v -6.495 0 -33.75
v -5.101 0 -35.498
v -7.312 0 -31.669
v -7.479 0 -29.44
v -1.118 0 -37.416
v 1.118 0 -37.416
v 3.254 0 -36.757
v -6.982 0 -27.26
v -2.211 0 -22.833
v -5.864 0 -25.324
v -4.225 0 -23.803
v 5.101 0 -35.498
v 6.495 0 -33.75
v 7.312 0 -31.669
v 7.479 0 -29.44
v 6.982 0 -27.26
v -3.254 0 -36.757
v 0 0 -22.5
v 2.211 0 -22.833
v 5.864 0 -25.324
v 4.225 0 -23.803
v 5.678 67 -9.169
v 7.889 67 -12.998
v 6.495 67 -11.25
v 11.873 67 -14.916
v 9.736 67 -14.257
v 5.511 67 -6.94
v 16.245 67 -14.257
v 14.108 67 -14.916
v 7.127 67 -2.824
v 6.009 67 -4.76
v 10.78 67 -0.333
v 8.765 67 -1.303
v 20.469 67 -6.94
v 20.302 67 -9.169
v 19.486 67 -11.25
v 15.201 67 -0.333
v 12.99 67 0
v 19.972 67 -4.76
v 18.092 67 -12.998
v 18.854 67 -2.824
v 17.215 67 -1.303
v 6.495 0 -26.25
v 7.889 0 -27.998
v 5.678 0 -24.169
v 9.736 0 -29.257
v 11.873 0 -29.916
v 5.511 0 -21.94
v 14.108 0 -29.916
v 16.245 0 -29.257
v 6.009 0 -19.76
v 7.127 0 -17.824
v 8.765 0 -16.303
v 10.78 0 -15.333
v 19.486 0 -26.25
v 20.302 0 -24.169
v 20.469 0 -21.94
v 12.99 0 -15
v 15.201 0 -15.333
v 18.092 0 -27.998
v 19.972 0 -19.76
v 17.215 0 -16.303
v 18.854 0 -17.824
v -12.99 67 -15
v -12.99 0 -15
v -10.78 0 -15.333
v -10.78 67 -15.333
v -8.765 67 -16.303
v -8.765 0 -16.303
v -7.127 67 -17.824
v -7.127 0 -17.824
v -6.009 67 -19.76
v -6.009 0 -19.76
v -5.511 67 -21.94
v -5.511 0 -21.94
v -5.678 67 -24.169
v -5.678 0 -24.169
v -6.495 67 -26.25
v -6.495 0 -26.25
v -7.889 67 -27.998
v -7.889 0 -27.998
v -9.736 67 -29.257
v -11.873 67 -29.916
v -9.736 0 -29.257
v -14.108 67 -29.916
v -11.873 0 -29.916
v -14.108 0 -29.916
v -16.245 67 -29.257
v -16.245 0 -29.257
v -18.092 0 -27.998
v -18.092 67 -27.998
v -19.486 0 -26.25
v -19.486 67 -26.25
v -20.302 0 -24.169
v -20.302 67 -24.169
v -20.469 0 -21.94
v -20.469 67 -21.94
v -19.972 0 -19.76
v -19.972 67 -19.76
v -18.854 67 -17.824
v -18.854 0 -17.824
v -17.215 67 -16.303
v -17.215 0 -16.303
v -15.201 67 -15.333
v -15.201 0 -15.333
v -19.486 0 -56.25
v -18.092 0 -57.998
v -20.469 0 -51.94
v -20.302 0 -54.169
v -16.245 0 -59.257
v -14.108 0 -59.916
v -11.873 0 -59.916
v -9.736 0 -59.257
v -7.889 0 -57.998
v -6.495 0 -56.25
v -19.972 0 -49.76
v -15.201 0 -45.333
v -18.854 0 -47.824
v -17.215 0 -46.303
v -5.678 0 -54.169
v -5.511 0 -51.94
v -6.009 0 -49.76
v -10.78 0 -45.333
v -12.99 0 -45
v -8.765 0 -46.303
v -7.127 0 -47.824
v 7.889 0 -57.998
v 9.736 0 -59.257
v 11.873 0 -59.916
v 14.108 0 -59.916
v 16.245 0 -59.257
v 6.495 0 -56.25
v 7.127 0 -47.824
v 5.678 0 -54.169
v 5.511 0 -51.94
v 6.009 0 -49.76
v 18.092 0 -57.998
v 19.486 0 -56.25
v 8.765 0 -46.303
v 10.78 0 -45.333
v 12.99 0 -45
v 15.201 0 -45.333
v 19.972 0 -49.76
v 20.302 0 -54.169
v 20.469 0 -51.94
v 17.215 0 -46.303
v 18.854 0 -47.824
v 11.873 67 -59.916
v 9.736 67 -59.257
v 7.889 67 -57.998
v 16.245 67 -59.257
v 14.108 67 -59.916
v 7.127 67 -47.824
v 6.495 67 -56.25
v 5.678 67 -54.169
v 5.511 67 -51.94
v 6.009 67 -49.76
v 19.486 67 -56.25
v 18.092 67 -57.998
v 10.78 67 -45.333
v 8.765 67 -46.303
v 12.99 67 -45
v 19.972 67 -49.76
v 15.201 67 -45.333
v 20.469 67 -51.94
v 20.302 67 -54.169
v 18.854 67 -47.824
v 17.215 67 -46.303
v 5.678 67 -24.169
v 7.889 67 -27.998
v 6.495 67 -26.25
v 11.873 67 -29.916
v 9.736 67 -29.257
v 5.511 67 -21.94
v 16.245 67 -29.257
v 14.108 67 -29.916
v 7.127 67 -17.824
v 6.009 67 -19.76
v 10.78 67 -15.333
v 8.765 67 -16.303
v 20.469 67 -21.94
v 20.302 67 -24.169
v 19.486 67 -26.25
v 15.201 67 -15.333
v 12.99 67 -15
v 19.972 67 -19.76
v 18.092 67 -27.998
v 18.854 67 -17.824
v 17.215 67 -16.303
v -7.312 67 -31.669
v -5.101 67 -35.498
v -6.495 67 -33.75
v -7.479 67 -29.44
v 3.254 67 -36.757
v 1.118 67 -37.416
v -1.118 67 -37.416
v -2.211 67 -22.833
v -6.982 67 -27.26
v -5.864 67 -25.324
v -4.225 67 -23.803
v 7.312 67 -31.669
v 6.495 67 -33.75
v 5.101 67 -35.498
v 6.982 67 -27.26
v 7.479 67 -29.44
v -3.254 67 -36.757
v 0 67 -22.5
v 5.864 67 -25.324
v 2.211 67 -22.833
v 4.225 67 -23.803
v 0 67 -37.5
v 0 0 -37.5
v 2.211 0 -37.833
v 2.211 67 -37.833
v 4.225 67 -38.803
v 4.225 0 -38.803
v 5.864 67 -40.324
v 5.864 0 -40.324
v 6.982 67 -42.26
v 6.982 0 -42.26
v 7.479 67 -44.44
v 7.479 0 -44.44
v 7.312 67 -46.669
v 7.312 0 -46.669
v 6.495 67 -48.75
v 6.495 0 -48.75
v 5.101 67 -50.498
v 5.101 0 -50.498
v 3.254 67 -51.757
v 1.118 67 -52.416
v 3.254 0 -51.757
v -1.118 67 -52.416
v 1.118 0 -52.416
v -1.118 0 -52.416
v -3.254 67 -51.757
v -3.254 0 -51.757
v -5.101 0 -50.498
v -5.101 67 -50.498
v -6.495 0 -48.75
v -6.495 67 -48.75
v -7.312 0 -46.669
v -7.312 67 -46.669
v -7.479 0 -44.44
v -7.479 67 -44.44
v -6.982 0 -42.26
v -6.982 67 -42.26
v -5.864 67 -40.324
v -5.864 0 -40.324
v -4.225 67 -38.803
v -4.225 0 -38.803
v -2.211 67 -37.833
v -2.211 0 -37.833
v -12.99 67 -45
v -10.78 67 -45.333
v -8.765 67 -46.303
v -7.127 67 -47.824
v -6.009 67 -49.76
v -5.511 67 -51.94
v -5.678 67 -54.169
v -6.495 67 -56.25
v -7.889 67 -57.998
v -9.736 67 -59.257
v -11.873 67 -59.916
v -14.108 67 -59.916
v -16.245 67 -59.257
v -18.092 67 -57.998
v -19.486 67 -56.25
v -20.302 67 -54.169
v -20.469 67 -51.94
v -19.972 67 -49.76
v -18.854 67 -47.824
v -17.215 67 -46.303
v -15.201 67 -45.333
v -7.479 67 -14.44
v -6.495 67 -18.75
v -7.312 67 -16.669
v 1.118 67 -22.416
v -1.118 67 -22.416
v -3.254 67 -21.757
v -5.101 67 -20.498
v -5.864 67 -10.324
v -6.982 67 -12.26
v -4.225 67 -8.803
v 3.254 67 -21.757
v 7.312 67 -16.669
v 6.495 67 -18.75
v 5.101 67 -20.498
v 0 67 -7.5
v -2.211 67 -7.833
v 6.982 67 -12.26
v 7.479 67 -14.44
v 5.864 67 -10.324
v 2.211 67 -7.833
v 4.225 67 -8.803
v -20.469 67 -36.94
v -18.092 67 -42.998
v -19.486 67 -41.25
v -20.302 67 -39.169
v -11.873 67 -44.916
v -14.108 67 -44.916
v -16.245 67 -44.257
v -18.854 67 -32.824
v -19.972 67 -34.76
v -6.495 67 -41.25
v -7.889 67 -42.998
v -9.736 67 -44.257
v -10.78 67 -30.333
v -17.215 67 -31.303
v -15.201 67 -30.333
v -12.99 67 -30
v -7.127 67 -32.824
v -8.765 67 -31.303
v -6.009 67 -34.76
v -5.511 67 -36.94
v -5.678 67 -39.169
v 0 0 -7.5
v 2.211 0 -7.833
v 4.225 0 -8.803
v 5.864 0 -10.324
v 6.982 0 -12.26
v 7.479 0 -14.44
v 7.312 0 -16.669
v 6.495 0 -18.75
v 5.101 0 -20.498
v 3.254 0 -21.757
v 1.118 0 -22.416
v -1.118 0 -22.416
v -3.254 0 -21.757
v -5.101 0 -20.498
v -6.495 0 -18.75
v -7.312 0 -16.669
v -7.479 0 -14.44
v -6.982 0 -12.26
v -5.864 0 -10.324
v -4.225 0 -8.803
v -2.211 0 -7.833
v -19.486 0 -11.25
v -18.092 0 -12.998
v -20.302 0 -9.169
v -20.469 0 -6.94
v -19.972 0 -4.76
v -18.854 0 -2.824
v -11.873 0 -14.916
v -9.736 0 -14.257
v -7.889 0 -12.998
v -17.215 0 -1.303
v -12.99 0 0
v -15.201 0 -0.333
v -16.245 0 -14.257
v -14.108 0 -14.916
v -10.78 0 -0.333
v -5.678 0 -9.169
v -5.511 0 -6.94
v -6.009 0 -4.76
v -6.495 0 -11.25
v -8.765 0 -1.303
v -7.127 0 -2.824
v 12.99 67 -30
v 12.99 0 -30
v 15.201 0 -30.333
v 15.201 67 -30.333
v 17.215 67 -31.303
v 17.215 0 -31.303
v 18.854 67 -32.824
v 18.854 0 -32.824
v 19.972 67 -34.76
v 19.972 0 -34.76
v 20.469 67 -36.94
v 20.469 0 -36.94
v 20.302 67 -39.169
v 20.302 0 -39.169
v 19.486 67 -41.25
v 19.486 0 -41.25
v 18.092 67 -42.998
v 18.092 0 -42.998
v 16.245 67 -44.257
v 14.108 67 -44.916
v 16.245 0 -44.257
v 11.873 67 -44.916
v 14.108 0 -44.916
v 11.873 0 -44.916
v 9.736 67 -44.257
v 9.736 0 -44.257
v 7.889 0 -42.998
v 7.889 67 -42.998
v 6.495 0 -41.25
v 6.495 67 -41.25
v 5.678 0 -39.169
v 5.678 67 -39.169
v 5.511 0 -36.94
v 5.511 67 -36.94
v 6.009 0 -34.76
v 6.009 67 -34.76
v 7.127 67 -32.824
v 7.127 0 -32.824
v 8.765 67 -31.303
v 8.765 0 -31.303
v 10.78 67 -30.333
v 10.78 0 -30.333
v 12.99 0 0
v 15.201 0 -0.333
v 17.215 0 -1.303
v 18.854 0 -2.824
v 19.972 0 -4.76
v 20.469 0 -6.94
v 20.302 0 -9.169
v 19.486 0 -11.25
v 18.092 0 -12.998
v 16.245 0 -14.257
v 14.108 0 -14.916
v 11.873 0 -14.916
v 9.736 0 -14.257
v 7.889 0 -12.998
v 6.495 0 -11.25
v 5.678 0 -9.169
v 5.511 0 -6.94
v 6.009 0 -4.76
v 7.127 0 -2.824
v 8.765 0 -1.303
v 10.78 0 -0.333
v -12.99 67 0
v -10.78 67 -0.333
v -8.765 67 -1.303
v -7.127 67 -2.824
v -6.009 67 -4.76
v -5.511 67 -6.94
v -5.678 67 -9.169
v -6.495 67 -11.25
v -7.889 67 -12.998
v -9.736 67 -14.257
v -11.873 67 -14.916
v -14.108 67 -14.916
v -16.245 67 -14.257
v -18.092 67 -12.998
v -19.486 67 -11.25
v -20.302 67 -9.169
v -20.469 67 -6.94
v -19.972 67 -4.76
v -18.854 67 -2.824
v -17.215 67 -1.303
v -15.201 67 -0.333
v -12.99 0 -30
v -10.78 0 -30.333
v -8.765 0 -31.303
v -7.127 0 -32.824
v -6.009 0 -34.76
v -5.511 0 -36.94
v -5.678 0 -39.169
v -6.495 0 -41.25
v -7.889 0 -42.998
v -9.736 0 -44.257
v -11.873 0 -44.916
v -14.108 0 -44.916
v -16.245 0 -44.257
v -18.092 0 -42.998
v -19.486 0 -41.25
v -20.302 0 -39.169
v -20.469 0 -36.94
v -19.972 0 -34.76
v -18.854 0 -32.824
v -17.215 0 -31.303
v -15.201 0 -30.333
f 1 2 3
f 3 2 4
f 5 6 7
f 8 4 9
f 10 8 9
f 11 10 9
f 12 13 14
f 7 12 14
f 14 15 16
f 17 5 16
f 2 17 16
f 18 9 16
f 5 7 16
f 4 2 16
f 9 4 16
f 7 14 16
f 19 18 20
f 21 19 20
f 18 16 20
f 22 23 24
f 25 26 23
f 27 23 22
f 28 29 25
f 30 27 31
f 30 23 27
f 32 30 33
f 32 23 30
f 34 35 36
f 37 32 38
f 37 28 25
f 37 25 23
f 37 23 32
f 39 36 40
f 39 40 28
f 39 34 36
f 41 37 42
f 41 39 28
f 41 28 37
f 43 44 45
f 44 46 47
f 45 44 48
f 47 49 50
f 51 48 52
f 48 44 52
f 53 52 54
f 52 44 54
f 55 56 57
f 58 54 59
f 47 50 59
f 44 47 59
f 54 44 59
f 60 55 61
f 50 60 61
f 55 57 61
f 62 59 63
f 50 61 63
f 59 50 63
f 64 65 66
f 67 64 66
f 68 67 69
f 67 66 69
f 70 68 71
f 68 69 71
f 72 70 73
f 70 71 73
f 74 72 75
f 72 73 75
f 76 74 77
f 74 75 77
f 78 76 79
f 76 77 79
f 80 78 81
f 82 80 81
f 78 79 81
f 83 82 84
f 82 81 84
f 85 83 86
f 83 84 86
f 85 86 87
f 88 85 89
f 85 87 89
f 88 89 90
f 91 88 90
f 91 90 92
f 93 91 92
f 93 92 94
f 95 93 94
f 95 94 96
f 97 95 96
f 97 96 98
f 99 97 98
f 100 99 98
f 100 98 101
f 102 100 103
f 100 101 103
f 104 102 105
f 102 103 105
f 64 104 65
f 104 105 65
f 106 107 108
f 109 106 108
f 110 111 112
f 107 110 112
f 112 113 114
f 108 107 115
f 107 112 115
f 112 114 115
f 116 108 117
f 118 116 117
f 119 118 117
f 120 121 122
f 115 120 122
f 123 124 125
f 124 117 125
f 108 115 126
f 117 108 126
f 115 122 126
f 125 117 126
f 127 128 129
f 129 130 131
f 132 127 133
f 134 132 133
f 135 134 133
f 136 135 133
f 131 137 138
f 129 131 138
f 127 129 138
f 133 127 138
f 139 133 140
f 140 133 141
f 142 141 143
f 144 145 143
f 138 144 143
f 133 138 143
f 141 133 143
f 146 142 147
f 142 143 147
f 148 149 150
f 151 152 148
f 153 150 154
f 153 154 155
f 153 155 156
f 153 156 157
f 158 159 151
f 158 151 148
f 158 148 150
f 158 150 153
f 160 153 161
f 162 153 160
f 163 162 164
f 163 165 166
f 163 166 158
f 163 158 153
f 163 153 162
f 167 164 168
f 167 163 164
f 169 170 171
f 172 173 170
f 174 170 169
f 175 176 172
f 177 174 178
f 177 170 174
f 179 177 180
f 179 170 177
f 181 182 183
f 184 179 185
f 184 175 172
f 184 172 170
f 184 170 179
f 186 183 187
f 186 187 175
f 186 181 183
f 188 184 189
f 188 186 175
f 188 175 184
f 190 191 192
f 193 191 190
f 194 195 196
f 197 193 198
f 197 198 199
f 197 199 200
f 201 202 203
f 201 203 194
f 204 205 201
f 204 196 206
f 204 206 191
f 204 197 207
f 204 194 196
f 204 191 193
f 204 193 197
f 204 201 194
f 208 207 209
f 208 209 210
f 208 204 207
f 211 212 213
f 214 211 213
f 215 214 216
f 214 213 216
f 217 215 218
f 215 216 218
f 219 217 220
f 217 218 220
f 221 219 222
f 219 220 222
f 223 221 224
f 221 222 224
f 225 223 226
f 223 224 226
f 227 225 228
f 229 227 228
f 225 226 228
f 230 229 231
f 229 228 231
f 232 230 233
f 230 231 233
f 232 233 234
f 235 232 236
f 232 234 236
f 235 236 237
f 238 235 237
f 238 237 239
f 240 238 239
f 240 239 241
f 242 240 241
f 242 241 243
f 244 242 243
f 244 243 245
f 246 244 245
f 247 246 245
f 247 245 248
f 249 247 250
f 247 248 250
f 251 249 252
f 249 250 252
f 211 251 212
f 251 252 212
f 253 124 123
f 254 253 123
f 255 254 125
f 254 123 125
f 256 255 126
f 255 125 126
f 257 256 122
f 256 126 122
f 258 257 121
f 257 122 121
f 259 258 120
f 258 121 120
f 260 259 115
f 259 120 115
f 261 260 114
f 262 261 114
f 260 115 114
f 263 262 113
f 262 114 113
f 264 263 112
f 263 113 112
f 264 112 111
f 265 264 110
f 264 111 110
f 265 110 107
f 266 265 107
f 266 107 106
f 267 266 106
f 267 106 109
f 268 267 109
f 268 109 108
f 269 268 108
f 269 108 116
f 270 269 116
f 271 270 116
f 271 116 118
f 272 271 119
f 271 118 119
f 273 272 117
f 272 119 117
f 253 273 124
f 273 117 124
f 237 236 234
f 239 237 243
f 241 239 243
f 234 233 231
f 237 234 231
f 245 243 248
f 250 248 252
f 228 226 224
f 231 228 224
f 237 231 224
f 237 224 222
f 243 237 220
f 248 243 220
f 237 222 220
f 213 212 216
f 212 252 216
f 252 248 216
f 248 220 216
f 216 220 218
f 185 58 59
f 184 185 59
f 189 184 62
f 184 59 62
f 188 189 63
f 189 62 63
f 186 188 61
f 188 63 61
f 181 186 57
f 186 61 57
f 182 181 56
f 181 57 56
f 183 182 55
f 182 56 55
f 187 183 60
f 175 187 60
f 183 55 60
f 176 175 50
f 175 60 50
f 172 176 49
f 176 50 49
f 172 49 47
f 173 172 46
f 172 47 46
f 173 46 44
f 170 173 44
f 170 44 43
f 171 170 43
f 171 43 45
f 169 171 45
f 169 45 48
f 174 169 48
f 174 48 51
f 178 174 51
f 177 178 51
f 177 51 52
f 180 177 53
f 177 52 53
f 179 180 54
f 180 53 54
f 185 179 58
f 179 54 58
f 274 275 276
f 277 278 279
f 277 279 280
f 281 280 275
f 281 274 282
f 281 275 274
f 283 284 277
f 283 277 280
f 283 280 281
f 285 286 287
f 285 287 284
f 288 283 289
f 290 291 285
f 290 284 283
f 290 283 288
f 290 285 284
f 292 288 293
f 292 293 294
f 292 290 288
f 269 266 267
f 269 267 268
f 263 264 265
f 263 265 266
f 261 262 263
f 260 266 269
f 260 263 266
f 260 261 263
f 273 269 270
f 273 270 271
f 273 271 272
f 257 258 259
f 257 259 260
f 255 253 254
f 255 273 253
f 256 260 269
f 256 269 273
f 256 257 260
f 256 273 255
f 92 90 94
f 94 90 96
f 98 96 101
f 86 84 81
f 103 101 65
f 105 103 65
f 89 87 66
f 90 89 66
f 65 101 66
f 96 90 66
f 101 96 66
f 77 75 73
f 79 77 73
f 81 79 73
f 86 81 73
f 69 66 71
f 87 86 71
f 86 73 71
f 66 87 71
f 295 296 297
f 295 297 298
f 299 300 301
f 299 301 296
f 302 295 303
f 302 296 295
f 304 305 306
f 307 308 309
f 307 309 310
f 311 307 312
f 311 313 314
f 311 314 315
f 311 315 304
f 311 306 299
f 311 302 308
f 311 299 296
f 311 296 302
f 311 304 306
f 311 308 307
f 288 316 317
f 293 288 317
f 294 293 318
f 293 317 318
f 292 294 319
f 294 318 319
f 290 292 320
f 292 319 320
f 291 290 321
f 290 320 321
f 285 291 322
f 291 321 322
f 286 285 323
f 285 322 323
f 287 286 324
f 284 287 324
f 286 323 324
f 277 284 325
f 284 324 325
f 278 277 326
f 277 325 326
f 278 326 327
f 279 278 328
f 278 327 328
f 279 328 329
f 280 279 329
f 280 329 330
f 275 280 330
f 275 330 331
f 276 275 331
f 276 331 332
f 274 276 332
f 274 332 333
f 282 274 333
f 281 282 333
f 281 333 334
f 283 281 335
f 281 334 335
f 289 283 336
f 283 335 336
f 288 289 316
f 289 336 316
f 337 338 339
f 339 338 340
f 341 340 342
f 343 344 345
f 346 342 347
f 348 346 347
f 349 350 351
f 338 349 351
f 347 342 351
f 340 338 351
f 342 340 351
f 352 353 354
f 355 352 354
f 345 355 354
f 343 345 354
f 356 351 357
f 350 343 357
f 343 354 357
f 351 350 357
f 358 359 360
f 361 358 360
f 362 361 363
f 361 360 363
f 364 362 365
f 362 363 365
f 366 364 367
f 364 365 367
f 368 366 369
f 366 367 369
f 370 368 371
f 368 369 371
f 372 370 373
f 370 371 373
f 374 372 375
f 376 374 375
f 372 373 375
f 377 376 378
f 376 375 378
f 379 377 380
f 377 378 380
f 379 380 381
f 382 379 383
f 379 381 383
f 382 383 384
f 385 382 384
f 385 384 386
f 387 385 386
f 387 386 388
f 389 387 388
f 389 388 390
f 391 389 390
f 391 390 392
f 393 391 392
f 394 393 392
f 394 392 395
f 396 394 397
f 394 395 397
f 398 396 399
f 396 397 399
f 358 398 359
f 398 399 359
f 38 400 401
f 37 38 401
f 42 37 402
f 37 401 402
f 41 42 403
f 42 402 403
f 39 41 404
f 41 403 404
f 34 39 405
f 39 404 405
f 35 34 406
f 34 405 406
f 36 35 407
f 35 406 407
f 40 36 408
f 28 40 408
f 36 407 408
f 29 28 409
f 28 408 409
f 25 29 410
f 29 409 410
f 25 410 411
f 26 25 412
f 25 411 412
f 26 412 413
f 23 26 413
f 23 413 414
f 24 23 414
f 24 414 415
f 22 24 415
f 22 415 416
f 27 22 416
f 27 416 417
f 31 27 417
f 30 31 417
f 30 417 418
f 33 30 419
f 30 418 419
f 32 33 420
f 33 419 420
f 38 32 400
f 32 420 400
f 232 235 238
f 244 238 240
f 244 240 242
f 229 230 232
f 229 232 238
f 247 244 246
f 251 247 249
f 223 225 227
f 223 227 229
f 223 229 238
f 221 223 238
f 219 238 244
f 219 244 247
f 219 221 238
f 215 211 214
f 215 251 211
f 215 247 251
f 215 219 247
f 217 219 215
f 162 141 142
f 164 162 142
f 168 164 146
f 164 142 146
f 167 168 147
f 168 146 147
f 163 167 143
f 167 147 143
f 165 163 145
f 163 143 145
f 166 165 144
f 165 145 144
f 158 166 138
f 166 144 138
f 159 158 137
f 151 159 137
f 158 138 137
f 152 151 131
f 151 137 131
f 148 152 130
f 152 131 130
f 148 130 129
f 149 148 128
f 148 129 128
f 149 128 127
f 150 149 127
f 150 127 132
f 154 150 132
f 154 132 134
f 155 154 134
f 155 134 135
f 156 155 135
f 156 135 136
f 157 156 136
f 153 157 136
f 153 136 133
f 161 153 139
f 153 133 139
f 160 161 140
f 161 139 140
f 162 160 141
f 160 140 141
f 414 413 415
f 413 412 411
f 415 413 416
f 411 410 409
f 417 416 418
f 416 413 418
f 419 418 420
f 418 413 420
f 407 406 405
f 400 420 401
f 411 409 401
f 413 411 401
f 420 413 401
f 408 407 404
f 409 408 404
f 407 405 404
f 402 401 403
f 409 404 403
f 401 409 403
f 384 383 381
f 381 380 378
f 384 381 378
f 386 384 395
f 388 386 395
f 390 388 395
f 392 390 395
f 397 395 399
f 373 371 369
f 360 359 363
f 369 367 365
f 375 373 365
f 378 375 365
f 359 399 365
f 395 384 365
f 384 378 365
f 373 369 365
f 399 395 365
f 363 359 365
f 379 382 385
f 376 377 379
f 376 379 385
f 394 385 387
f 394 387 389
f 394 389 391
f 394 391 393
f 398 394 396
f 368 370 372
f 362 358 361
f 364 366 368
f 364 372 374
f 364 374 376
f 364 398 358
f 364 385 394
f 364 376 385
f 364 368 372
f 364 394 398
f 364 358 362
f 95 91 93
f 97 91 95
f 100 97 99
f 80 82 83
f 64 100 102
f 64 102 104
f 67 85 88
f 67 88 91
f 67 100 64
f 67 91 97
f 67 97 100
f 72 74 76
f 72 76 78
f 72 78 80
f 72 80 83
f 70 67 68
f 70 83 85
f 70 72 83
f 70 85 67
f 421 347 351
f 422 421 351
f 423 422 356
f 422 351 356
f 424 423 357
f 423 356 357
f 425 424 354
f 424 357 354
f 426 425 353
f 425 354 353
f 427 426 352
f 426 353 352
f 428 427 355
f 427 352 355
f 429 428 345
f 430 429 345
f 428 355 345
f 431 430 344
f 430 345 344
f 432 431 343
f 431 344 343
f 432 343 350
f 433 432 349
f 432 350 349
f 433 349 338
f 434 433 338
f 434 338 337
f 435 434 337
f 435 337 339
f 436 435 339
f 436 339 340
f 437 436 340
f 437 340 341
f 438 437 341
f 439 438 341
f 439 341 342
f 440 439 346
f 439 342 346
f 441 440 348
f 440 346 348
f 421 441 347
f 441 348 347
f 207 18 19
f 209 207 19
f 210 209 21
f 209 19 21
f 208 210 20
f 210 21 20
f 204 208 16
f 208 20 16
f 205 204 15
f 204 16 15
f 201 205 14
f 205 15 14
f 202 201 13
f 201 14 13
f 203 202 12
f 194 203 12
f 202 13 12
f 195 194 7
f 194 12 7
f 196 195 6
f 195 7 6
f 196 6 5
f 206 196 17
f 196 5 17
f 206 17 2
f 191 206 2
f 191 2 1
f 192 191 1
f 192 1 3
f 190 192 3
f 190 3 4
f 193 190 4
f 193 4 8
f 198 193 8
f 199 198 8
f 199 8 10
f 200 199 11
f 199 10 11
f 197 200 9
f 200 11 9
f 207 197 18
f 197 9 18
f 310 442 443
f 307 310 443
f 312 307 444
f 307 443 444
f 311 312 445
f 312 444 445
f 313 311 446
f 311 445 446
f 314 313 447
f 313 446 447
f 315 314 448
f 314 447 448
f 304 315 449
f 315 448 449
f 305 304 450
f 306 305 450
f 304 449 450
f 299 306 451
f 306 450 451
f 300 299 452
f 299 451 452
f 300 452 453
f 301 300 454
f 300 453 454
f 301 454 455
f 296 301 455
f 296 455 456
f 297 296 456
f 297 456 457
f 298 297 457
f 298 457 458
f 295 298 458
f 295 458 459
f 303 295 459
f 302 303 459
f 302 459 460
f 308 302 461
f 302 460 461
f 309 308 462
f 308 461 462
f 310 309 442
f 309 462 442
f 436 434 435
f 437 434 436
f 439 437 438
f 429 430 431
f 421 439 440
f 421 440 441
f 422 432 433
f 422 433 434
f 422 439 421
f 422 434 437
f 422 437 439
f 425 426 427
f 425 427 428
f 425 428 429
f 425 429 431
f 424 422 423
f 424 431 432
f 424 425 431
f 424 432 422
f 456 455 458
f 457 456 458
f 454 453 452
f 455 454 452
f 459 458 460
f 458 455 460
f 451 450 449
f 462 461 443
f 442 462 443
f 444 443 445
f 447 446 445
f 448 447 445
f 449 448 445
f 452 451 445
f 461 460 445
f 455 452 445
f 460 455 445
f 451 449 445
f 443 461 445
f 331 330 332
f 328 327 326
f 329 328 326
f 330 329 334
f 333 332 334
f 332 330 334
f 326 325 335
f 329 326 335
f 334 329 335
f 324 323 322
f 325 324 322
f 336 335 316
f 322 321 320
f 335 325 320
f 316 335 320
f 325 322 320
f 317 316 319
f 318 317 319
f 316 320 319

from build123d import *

# Parameters (mm, degrees)
SKETCH1_R              = 7.5
BOSS_EXTRUDE1_DEPTH    = 67
BOSS_EXTRUDE1_2_DEPTH  = 67
BOSS_EXTRUDE1_3_DEPTH  = 67
BOSS_EXTRUDE1_4_DEPTH  = 67
BOSS_EXTRUDE1_5_DEPTH  = 67
BOSS_EXTRUDE1_6_DEPTH  = 67
BOSS_EXTRUDE1_7_DEPTH  = 67
BOSS_EXTRUDE1_8_DEPTH  = 67
BOSS_EXTRUDE1_9_DEPTH  = 67
BOSS_EXTRUDE1_10_DEPTH = 67
BOSS_EXTRUDE1_11_DEPTH = 67


with BuildPart() as part:
    # Sketch1 → Boss-Extrude1 (new body)
    with BuildSketch(Plane(origin=(0, 0, 0), x_dir=(1, 0, 0), z_dir=(0, 1, 0))):
        with Locations(Location((0, 30, 0), (0, 0, 270))):
            Circle(SKETCH1_R)
    extrude(amount=BOSS_EXTRUDE1_DEPTH)


with BuildPart() as body_2:
    # Sketch1 → Boss-Extrude1 2 (new body)
    with BuildSketch(Plane(origin=(0, 0, 0), x_dir=(1, 0, 0), z_dir=(0, 1, 0))):
        with Locations(Location((0, 45, 0), (0, 0, 270))):
            Circle(SKETCH1_R)
    extrude(amount=BOSS_EXTRUDE1_2_DEPTH)


with BuildPart() as body_3:
    # Sketch1 → Boss-Extrude1 3 (new body)
    with BuildSketch(Plane(origin=(0, 0, 0), x_dir=(1, 0, 0), z_dir=(0, 1, 0))):
        with Locations(Location((0, 15, 0), (0, 0, 270))):
            Circle(SKETCH1_R)
    extrude(amount=BOSS_EXTRUDE1_3_DEPTH)


with BuildPart() as body_4:
    # Sketch1 → Boss-Extrude1 4 (new body)
    with BuildSketch(Plane(origin=(0, 0, 0), x_dir=(1, 0, 0), z_dir=(0, 1, 0))):
        with Locations(Location((-12.990381057, 7.5, 0), (0, 0, 270))):
            Circle(SKETCH1_R)
    extrude(amount=BOSS_EXTRUDE1_4_DEPTH)


with BuildPart() as body_5:
    # Sketch1 → Boss-Extrude1 5 (new body)
    with BuildSketch(Plane(origin=(0, 0, 0), x_dir=(1, 0, 0), z_dir=(0, 1, 0))):
        with Locations(Location((-12.990381057, 22.5, 0), (0, 0, 270))):
            Circle(SKETCH1_R)
    extrude(amount=BOSS_EXTRUDE1_5_DEPTH)


with BuildPart() as body_6:
    # Sketch1 → Boss-Extrude1 6 (new body)
    with BuildSketch(Plane(origin=(0, 0, 0), x_dir=(1, 0, 0), z_dir=(0, 1, 0))):
        with Locations(Location((-12.990381057, 37.5, 0), (0, 0, 270))):
            Circle(SKETCH1_R)
    extrude(amount=BOSS_EXTRUDE1_6_DEPTH)


with BuildPart() as body_7:
    # Sketch1 → Boss-Extrude1 7 (new body)
    with BuildSketch(Plane(origin=(0, 0, 0), x_dir=(1, 0, 0), z_dir=(0, 1, 0))):
        with Locations(Location((-12.990381057, 52.5, 0), (0, 0, 270))):
            Circle(SKETCH1_R)
    extrude(amount=BOSS_EXTRUDE1_7_DEPTH)


with BuildPart() as body_8:
    # Sketch1 → Boss-Extrude1 8 (new body)
    with BuildSketch(Plane(origin=(0, 0, 0), x_dir=(1, 0, 0), z_dir=(0, 1, 0))):
        with Locations(Location((12.990381057, 7.5, 0), (0, 0, 270))):
            Circle(SKETCH1_R)
    extrude(amount=BOSS_EXTRUDE1_8_DEPTH)


with BuildPart() as body_9:
    # Sketch1 → Boss-Extrude1 9 (new body)
    with BuildSketch(Plane(origin=(0, 0, 0), x_dir=(1, 0, 0), z_dir=(0, 1, 0))):
        with Locations(Location((12.990381057, 22.5, 0), (0, 0, 270))):
            Circle(SKETCH1_R)
    extrude(amount=BOSS_EXTRUDE1_9_DEPTH)


with BuildPart() as body_10:
    # Sketch1 → Boss-Extrude1 10 (new body)
    with BuildSketch(Plane(origin=(0, 0, 0), x_dir=(1, 0, 0), z_dir=(0, 1, 0))):
        with Locations(Location((12.990381057, 37.5, 0), (0, 0, 270))):
            Circle(SKETCH1_R)
    extrude(amount=BOSS_EXTRUDE1_10_DEPTH)


with BuildPart() as body_11:
    # Sketch1 → Boss-Extrude1 11 (new body)
    with BuildSketch(Plane(origin=(0, 0, 0), x_dir=(1, 0, 0), z_dir=(0, 1, 0))):
        with Locations(Location((12.990381057, 52.5, 0), (0, 0, 270))):
            Circle(SKETCH1_R)
    extrude(amount=BOSS_EXTRUDE1_11_DEPTH)


solid = Compound([part.part, body_2.part, body_3.part, body_4.part, body_5.part, body_6.part, body_7.part, body_8.part, body_9.part, body_10.part, body_11.part])
